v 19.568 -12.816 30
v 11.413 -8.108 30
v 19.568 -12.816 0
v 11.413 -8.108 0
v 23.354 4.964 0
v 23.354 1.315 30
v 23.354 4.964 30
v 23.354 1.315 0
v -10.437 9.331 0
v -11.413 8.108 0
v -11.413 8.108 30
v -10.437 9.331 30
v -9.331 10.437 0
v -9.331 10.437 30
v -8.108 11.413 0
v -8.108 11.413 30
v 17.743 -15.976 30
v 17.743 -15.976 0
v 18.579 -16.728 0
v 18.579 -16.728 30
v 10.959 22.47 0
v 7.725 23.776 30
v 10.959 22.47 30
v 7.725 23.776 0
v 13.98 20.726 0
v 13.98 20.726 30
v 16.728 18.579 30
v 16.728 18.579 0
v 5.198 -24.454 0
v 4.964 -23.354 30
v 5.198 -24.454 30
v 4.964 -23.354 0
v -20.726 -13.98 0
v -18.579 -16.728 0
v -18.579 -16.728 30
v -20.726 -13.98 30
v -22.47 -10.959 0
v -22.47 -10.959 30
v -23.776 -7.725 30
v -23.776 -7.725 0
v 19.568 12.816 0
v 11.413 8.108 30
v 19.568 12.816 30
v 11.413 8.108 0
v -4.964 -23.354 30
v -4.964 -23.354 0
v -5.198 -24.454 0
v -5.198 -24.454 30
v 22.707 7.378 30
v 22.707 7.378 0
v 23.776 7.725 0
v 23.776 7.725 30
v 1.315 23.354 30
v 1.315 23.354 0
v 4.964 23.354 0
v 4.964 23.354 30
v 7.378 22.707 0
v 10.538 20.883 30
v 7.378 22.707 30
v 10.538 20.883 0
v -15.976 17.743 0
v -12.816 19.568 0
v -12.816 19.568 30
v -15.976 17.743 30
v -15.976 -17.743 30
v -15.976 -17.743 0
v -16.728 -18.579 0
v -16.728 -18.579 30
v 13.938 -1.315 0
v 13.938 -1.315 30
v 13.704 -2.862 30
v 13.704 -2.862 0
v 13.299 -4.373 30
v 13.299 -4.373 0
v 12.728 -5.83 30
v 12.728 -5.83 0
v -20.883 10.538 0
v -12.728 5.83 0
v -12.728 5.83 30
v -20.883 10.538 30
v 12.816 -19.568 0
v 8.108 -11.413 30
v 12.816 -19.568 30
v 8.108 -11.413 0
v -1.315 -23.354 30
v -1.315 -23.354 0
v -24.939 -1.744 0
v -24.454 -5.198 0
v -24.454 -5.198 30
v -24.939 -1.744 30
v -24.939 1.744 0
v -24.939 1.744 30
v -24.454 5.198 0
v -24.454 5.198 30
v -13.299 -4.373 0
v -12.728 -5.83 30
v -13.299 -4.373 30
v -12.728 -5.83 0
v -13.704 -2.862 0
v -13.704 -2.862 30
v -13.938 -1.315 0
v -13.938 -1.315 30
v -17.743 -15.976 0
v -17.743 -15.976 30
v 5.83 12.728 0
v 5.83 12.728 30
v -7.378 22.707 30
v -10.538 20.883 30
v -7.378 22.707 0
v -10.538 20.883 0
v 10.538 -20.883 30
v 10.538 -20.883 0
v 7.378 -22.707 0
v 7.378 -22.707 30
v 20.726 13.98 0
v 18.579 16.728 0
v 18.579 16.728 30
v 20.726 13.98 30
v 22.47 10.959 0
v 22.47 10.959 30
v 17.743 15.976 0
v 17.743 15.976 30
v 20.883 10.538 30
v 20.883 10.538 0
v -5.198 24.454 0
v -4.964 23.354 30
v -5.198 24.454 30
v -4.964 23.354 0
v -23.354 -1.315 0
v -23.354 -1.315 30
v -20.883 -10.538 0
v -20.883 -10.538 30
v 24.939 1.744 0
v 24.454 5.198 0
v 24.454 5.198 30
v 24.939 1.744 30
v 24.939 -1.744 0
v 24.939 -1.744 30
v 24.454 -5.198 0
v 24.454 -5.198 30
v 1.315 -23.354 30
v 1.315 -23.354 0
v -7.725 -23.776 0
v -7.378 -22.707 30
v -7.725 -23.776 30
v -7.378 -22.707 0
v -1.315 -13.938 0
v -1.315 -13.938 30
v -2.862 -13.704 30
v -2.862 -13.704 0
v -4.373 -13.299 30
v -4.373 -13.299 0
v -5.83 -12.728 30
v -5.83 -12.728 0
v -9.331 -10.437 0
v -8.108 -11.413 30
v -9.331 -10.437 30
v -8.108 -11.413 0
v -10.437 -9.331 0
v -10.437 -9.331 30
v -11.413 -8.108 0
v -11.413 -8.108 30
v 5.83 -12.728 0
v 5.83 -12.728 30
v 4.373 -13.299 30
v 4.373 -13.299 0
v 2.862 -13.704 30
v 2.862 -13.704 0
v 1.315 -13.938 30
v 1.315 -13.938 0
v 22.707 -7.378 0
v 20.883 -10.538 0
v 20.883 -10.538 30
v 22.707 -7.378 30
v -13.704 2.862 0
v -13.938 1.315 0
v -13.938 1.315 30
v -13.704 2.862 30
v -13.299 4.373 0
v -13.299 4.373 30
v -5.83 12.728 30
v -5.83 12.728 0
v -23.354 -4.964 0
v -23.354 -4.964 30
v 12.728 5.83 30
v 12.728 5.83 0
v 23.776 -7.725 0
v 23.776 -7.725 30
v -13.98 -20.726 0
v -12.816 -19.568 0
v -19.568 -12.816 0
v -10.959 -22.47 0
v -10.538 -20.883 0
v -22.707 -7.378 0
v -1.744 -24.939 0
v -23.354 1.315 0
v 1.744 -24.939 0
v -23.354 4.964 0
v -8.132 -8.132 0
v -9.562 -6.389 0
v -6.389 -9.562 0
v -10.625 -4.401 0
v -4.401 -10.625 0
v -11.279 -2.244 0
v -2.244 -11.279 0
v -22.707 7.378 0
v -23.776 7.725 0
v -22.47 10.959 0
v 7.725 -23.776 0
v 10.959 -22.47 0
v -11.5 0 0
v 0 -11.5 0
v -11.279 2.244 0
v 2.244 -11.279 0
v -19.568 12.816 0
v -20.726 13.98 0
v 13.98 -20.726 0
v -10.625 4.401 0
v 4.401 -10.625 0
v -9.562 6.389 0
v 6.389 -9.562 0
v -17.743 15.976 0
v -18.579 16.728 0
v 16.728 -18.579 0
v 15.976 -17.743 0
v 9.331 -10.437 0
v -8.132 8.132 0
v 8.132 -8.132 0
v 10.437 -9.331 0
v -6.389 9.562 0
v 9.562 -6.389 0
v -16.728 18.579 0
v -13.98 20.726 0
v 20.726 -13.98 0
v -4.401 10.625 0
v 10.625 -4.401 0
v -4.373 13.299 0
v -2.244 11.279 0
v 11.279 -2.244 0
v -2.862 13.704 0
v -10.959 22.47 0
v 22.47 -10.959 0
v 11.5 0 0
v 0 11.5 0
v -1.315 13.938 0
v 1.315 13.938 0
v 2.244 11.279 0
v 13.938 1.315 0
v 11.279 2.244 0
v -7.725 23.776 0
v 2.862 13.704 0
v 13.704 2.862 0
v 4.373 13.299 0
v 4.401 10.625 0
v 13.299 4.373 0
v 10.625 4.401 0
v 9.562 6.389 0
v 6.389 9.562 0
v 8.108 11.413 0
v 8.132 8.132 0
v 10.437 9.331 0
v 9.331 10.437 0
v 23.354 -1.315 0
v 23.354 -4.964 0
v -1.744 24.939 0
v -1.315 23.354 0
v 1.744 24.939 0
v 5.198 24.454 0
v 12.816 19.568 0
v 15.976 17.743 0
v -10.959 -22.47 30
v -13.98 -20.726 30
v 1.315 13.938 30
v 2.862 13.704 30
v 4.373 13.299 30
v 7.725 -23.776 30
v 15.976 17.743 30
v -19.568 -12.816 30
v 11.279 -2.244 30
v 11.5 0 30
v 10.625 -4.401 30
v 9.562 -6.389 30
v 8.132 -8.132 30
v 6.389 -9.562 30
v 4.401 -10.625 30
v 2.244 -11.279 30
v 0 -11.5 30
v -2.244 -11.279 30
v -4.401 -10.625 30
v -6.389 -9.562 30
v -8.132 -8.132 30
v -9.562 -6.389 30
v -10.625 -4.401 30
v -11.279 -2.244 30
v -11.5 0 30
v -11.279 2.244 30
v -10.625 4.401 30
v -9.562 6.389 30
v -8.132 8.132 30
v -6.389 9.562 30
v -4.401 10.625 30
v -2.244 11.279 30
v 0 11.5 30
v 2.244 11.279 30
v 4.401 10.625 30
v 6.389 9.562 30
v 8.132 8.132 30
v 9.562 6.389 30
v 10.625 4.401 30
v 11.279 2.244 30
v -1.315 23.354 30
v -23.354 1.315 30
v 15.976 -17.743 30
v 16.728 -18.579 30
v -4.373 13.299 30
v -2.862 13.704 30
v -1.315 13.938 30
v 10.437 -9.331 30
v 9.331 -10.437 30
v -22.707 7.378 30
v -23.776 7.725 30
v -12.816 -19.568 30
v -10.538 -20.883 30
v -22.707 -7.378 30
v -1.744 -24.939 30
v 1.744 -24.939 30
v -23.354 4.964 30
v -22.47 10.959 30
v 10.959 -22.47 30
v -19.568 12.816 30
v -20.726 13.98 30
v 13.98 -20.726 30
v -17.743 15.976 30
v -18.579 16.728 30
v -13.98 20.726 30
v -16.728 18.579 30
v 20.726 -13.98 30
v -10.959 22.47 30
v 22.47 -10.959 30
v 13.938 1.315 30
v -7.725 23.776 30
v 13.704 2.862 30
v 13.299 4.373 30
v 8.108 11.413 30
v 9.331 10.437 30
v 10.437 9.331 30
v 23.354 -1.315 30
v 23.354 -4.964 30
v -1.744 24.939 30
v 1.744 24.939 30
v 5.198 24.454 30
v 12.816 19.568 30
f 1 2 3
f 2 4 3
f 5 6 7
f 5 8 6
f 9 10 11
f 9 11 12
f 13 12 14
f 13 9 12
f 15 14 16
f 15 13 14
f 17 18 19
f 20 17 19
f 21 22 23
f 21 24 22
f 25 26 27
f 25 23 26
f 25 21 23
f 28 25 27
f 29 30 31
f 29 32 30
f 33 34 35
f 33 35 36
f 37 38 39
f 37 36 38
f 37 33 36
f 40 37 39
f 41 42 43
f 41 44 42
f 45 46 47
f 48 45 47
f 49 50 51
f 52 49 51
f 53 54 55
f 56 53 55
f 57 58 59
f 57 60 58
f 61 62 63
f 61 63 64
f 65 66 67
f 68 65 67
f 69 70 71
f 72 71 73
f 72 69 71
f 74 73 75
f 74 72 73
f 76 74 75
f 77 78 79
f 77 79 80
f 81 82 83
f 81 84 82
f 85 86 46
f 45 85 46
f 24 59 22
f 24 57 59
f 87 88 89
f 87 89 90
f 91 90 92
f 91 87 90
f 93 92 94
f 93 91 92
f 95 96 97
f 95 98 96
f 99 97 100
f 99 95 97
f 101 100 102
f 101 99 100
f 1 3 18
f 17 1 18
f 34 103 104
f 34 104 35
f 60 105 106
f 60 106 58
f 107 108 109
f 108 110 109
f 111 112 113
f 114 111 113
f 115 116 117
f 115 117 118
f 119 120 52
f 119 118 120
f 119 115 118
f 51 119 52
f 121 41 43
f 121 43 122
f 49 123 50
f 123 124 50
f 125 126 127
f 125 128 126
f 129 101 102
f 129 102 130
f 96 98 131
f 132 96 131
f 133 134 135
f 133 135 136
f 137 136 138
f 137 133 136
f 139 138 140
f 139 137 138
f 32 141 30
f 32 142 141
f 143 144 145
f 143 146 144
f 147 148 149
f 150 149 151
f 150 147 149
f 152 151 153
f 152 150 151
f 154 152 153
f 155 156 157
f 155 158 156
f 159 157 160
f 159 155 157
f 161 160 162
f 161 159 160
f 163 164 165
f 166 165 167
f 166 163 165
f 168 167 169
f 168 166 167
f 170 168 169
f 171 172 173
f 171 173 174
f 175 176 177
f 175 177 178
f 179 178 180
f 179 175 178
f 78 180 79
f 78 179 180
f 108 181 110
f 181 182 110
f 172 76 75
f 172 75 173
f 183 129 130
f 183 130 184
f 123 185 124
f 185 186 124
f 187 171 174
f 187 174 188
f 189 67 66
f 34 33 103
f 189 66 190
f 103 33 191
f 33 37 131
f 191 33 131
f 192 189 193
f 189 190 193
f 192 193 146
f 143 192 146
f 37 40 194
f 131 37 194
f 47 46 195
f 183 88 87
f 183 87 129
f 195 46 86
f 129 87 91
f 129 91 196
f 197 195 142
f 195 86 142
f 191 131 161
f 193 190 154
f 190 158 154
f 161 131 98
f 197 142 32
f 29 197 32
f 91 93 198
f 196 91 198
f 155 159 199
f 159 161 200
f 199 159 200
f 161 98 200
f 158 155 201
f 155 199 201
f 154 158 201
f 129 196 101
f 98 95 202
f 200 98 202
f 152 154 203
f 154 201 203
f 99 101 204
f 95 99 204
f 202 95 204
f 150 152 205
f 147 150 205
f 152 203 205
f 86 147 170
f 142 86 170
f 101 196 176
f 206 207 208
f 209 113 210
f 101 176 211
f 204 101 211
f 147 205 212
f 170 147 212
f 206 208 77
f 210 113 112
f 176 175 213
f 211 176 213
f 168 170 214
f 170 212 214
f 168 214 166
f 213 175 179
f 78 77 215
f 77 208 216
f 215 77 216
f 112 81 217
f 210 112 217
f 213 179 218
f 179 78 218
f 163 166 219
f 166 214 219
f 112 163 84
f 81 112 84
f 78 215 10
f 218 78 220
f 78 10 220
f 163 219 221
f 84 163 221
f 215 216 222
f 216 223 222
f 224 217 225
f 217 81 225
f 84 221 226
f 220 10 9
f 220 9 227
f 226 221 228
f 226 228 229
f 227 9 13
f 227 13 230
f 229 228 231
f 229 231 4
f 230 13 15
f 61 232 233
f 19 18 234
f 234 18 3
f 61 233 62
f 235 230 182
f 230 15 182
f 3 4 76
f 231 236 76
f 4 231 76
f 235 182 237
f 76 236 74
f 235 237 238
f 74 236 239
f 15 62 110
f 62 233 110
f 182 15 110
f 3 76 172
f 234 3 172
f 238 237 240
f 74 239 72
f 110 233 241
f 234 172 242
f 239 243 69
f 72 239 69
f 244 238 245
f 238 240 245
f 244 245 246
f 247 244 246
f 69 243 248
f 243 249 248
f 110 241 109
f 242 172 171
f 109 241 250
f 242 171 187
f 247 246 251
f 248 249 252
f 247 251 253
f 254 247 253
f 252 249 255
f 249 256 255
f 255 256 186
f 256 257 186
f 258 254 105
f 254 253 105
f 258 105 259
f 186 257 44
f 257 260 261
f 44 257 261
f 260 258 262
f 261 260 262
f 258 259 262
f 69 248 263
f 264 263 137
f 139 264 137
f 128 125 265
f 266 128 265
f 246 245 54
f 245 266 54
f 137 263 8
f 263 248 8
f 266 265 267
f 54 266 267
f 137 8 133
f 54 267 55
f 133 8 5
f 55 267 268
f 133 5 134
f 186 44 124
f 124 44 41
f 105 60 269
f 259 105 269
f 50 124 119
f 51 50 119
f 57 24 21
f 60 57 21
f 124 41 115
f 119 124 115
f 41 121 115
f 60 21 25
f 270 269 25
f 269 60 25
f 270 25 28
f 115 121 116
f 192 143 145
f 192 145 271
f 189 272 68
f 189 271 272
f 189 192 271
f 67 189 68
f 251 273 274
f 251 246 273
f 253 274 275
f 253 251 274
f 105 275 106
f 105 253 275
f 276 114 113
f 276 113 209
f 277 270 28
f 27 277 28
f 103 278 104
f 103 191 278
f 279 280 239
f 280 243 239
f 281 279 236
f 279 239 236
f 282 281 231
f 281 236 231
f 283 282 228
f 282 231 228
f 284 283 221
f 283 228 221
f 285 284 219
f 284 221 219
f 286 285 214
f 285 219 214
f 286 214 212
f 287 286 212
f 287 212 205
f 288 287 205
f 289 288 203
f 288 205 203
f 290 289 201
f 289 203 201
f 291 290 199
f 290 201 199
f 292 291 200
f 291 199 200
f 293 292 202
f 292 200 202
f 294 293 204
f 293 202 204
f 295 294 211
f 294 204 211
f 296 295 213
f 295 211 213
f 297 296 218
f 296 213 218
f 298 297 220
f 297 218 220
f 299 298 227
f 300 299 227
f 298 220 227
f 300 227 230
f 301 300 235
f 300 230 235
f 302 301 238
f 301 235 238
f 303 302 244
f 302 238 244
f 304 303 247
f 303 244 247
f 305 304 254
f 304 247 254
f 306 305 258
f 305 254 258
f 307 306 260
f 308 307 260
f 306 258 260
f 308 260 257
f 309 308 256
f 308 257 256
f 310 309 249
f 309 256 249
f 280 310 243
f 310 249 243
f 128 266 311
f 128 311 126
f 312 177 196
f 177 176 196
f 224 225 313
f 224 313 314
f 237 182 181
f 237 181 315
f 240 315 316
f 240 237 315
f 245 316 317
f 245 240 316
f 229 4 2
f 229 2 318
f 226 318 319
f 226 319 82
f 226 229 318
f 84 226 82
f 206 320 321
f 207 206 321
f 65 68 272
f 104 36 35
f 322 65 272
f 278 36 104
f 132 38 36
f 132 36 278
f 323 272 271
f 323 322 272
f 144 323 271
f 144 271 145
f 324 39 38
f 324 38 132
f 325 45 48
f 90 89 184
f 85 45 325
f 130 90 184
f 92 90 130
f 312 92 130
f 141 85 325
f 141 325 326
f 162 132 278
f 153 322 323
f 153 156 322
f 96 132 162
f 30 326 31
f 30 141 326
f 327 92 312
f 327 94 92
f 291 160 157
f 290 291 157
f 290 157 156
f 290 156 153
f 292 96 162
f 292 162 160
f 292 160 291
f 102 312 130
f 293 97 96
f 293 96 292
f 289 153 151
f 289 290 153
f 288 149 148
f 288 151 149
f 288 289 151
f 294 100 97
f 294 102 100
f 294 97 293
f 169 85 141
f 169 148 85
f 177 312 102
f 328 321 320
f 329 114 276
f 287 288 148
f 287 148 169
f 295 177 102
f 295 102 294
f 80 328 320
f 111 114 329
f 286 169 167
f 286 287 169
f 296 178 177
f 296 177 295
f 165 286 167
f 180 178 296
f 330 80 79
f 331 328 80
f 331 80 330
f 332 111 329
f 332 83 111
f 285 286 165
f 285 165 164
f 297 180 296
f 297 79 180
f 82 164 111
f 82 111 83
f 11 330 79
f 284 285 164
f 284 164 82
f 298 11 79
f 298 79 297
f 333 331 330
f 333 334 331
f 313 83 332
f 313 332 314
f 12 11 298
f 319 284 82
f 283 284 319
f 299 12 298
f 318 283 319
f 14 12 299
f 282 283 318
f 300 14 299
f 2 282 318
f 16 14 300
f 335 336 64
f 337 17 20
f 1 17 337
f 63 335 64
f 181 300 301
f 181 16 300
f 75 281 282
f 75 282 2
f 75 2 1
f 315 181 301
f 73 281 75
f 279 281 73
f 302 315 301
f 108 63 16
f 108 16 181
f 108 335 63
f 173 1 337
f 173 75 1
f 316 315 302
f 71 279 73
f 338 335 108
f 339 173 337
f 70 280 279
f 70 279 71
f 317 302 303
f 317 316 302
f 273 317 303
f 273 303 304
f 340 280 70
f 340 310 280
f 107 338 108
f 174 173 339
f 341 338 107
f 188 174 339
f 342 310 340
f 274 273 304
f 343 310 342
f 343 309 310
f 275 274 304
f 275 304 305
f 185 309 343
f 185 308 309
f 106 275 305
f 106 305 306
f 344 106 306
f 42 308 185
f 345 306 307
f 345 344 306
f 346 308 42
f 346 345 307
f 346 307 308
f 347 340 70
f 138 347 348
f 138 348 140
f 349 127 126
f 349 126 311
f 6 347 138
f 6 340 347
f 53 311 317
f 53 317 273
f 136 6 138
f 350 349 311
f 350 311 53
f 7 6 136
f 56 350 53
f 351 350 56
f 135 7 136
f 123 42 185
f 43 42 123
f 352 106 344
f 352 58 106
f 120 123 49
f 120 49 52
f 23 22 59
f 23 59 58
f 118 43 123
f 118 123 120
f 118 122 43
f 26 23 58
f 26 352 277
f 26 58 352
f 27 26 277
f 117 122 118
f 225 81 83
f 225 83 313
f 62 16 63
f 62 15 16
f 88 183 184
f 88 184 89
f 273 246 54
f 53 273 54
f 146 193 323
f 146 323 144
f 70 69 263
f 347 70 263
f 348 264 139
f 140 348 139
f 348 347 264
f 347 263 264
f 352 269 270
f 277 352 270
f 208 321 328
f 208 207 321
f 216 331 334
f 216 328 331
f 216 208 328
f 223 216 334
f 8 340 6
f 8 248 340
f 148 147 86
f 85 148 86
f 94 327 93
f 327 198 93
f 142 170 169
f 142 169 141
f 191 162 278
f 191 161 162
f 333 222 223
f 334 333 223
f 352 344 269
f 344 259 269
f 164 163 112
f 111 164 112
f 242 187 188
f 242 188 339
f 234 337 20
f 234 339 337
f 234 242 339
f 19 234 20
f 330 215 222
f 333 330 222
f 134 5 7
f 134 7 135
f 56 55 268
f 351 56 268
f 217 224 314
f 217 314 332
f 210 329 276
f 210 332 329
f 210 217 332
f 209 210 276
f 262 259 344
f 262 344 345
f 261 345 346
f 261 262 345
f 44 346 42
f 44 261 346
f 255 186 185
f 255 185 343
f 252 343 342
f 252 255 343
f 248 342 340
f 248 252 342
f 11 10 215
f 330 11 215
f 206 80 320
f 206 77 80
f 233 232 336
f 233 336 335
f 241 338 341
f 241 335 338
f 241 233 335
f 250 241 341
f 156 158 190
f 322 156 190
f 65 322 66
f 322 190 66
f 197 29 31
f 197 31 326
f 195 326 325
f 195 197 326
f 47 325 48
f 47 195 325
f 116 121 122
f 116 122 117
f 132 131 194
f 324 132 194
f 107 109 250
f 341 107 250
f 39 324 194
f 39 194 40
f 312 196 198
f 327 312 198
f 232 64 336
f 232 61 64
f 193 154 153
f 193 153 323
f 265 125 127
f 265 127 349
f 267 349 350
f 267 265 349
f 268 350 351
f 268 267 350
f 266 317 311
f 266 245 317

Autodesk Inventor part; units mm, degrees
ref_plane "YZ Plane" through (0, 0, 0) normal (1, 0, 0) x (0, 1, 0)
ref_plane "XZ Plane" through (0, 0, 0) normal (0, 1, 0) x (-1, 0, 0)
ref_plane "XY Plane" through (0, 0, 0) normal (0, 0, 1) x (1, 0, 0)
sketch "Sketch1" plane through (0, 0, 0) normal (0, 0, 1) x (1, 0, 0)
  circle A0 centre (0, 0) radius 11.5
  circle A1 centre (0, 0) radius 25
  line L0 (-1.315, 13.9381) -> (-1.315, 23.3542)
  line L1 (-1.315, 23.3542) -> (-4.9641, 23.3542)
  line L2 (-4.9641, 23.3542) -> (-5.1978, 24.4537)
  line L3 (1.315, 13.9381) -> (1.315, 23.3542)
  line L4 (1.315, 23.3542) -> (4.9641, 23.3542)
  line L5 (4.9641, 23.3542) -> (5.1978, 24.4537)
  arc A2 (5.1978, 24.4537) -> (-5.1978, 24.4537) centre (0, 0) ccw
  circle A3 centre (0, 0) radius 14
  line L6 (-8.1079, 11.4133) -> (-12.8159, 19.5679)
  line L7 (-12.8159, 19.5679) -> (-15.9762, 17.7433)
  line L8 (-15.9762, 17.7433) -> (-16.7283, 18.5786)
  line L9 (-5.8303, 12.7282) -> (-10.5383, 20.8829)
  line L10 (-10.5383, 20.8829) -> (-7.3781, 22.7074)
  line L11 (-7.3781, 22.7074) -> (-7.7254, 23.7764)
  arc A4 (-7.7254, 23.7764) -> (-16.7283, 18.5786) centre (0, 0) ccw
  line L12 (-12.7282, 5.8303) -> (-20.8829, 10.5383)
  line L13 (-20.8829, 10.5383) -> (-22.7074, 7.3781)
  line L14 (-22.7074, 7.3781) -> (-23.7764, 7.7254)
  line L15 (-11.4133, 8.1079) -> (-19.5679, 12.8159)
  line L16 (-19.5679, 12.8159) -> (-17.7433, 15.9762)
  line L17 (-17.7433, 15.9762) -> (-18.5786, 16.7283)
  arc A5 (-18.5786, 16.7283) -> (-23.7764, 7.7254) centre (0, 0) ccw
  line L18 (-13.9381, -1.315) -> (-23.3542, -1.315)
  line L19 (-23.3542, -1.315) -> (-23.3542, -4.9641)
  line L20 (-23.3542, -4.9641) -> (-24.4537, -5.1978)
  line L21 (-13.9381, 1.315) -> (-23.3542, 1.315)
  line L22 (-23.3542, 1.315) -> (-23.3542, 4.9641)
  line L23 (-23.3542, 4.9641) -> (-24.4537, 5.1978)
  arc A6 (-24.4537, 5.1978) -> (-24.4537, -5.1978) centre (0, 0) ccw
  line L24 (-11.4133, -8.1079) -> (-19.5679, -12.8159)
  line L25 (-19.5679, -12.8159) -> (-17.7433, -15.9762)
  line L26 (-17.7433, -15.9762) -> (-18.5786, -16.7283)
  line L27 (-12.7282, -5.8303) -> (-20.8829, -10.5383)
  line L28 (-20.8829, -10.5383) -> (-22.7074, -7.3781)
  line L29 (-22.7074, -7.3781) -> (-23.7764, -7.7254)
  arc A7 (-23.7764, -7.7254) -> (-18.5786, -16.7283) centre (0, 0) ccw
  line L30 (-5.8303, -12.7282) -> (-10.5383, -20.8829)
  line L31 (-10.5383, -20.8829) -> (-7.3781, -22.7074)
  line L32 (-7.3781, -22.7074) -> (-7.7254, -23.7764)
  line L33 (-8.1079, -11.4133) -> (-12.8159, -19.5679)
  line L34 (-12.8159, -19.5679) -> (-15.9762, -17.7433)
  line L35 (-15.9762, -17.7433) -> (-16.7283, -18.5786)
  arc A8 (-16.7283, -18.5786) -> (-7.7254, -23.7764) centre (0, 0) ccw
  line L36 (1.315, -13.9381) -> (1.315, -23.3542)
  line L37 (1.315, -23.3542) -> (4.9641, -23.3542)
  line L38 (4.9641, -23.3542) -> (5.1978, -24.4537)
  line L39 (-1.315, -13.9381) -> (-1.315, -23.3542)
  line L40 (-1.315, -23.3542) -> (-4.9641, -23.3542)
  line L41 (-4.9641, -23.3542) -> (-5.1978, -24.4537)
  arc A9 (-5.1978, -24.4537) -> (5.1978, -24.4537) centre (0, 0) ccw
  line L42 (8.1079, -11.4133) -> (12.8159, -19.5679)
  line L43 (12.8159, -19.5679) -> (15.9762, -17.7433)
  line L44 (15.9762, -17.7433) -> (16.7283, -18.5786)
  line L45 (5.8303, -12.7282) -> (10.5383, -20.8829)
  line L46 (10.5383, -20.8829) -> (7.3781, -22.7074)
  line L47 (7.3781, -22.7074) -> (7.7254, -23.7764)
  arc A10 (7.7254, -23.7764) -> (16.7283, -18.5786) centre (0, 0) ccw
  line L48 (12.7282, -5.8303) -> (20.8829, -10.5383)
  line L49 (20.8829, -10.5383) -> (22.7074, -7.3781)
  line L50 (22.7074, -7.3781) -> (23.7764, -7.7254)
  line L51 (11.4133, -8.1079) -> (19.5679, -12.8159)
  line L52 (19.5679, -12.8159) -> (17.7433, -15.9762)
  line L53 (17.7433, -15.9762) -> (18.5786, -16.7283)
  arc A11 (18.5786, -16.7283) -> (23.7764, -7.7254) centre (0, 0) ccw
  line L54 (13.9381, 1.315) -> (23.3542, 1.315)
  line L55 (23.3542, 1.315) -> (23.3542, 4.9641)
  line L56 (23.3542, 4.9641) -> (24.4537, 5.1978)
  line L57 (13.9381, -1.315) -> (23.3542, -1.315)
  line L58 (23.3542, -1.315) -> (23.3542, -4.9641)
  line L59 (23.3542, -4.9641) -> (24.4537, -5.1978)
  arc A12 (24.4537, -5.1978) -> (24.4537, 5.1978) centre (0, 0) ccw
  line L60 (11.4133, 8.1079) -> (19.5679, 12.8159)
  line L61 (19.5679, 12.8159) -> (17.7433, 15.9762)
  line L62 (17.7433, 15.9762) -> (18.5786, 16.7283)
  line L63 (12.7282, 5.8303) -> (20.8829, 10.5383)
  line L64 (20.8829, 10.5383) -> (22.7074, 7.3781)
  line L65 (22.7074, 7.3781) -> (23.7764, 7.7254)
  arc A13 (23.7764, 7.7254) -> (18.5786, 16.7283) centre (0, 0) ccw
  line L66 (5.8303, 12.7282) -> (10.5383, 20.8829)
  line L67 (10.5383, 20.8829) -> (7.3781, 22.7074)
  line L68 (7.3781, 22.7074) -> (7.7254, 23.7764)
  line L69 (8.1079, 11.4133) -> (12.8159, 19.5679)
  line L70 (12.8159, 19.5679) -> (15.9762, 17.7433)
  line L71 (15.9762, 17.7433) -> (16.7283, 18.5786)
  arc A14 (16.7283, 18.5786) -> (7.7254, 23.7764) centre (0, 0) ccw
  dimension "d1" = 50
  dimension "d0" = 23
  dimension "d2" = 24
  dimension "d3" = 28
  dimension "d6" = 360
extrude "Extrusion1" add sketch "Sketch1" along normal blind 30 contours A3 | L5 L4 L3 A3 L0 L1 L2 A1
pattern_circular "Circular Pattern1" count 12 over 360 about axis through (0, 0, -10) along (0, 0, 1) of "Extrusion1"
equation "\"d1\" = stator_diameter"
equation "\"d0\" = stator_id"
equation "\"d8\" = stator_length"
equation "\"stator_length\" = 30"
equation "\"stator_id\" = 23"
equation "\"stator_diameter\" = 50"
properties part number "Stator" material "Steel, Mild, Welded"
